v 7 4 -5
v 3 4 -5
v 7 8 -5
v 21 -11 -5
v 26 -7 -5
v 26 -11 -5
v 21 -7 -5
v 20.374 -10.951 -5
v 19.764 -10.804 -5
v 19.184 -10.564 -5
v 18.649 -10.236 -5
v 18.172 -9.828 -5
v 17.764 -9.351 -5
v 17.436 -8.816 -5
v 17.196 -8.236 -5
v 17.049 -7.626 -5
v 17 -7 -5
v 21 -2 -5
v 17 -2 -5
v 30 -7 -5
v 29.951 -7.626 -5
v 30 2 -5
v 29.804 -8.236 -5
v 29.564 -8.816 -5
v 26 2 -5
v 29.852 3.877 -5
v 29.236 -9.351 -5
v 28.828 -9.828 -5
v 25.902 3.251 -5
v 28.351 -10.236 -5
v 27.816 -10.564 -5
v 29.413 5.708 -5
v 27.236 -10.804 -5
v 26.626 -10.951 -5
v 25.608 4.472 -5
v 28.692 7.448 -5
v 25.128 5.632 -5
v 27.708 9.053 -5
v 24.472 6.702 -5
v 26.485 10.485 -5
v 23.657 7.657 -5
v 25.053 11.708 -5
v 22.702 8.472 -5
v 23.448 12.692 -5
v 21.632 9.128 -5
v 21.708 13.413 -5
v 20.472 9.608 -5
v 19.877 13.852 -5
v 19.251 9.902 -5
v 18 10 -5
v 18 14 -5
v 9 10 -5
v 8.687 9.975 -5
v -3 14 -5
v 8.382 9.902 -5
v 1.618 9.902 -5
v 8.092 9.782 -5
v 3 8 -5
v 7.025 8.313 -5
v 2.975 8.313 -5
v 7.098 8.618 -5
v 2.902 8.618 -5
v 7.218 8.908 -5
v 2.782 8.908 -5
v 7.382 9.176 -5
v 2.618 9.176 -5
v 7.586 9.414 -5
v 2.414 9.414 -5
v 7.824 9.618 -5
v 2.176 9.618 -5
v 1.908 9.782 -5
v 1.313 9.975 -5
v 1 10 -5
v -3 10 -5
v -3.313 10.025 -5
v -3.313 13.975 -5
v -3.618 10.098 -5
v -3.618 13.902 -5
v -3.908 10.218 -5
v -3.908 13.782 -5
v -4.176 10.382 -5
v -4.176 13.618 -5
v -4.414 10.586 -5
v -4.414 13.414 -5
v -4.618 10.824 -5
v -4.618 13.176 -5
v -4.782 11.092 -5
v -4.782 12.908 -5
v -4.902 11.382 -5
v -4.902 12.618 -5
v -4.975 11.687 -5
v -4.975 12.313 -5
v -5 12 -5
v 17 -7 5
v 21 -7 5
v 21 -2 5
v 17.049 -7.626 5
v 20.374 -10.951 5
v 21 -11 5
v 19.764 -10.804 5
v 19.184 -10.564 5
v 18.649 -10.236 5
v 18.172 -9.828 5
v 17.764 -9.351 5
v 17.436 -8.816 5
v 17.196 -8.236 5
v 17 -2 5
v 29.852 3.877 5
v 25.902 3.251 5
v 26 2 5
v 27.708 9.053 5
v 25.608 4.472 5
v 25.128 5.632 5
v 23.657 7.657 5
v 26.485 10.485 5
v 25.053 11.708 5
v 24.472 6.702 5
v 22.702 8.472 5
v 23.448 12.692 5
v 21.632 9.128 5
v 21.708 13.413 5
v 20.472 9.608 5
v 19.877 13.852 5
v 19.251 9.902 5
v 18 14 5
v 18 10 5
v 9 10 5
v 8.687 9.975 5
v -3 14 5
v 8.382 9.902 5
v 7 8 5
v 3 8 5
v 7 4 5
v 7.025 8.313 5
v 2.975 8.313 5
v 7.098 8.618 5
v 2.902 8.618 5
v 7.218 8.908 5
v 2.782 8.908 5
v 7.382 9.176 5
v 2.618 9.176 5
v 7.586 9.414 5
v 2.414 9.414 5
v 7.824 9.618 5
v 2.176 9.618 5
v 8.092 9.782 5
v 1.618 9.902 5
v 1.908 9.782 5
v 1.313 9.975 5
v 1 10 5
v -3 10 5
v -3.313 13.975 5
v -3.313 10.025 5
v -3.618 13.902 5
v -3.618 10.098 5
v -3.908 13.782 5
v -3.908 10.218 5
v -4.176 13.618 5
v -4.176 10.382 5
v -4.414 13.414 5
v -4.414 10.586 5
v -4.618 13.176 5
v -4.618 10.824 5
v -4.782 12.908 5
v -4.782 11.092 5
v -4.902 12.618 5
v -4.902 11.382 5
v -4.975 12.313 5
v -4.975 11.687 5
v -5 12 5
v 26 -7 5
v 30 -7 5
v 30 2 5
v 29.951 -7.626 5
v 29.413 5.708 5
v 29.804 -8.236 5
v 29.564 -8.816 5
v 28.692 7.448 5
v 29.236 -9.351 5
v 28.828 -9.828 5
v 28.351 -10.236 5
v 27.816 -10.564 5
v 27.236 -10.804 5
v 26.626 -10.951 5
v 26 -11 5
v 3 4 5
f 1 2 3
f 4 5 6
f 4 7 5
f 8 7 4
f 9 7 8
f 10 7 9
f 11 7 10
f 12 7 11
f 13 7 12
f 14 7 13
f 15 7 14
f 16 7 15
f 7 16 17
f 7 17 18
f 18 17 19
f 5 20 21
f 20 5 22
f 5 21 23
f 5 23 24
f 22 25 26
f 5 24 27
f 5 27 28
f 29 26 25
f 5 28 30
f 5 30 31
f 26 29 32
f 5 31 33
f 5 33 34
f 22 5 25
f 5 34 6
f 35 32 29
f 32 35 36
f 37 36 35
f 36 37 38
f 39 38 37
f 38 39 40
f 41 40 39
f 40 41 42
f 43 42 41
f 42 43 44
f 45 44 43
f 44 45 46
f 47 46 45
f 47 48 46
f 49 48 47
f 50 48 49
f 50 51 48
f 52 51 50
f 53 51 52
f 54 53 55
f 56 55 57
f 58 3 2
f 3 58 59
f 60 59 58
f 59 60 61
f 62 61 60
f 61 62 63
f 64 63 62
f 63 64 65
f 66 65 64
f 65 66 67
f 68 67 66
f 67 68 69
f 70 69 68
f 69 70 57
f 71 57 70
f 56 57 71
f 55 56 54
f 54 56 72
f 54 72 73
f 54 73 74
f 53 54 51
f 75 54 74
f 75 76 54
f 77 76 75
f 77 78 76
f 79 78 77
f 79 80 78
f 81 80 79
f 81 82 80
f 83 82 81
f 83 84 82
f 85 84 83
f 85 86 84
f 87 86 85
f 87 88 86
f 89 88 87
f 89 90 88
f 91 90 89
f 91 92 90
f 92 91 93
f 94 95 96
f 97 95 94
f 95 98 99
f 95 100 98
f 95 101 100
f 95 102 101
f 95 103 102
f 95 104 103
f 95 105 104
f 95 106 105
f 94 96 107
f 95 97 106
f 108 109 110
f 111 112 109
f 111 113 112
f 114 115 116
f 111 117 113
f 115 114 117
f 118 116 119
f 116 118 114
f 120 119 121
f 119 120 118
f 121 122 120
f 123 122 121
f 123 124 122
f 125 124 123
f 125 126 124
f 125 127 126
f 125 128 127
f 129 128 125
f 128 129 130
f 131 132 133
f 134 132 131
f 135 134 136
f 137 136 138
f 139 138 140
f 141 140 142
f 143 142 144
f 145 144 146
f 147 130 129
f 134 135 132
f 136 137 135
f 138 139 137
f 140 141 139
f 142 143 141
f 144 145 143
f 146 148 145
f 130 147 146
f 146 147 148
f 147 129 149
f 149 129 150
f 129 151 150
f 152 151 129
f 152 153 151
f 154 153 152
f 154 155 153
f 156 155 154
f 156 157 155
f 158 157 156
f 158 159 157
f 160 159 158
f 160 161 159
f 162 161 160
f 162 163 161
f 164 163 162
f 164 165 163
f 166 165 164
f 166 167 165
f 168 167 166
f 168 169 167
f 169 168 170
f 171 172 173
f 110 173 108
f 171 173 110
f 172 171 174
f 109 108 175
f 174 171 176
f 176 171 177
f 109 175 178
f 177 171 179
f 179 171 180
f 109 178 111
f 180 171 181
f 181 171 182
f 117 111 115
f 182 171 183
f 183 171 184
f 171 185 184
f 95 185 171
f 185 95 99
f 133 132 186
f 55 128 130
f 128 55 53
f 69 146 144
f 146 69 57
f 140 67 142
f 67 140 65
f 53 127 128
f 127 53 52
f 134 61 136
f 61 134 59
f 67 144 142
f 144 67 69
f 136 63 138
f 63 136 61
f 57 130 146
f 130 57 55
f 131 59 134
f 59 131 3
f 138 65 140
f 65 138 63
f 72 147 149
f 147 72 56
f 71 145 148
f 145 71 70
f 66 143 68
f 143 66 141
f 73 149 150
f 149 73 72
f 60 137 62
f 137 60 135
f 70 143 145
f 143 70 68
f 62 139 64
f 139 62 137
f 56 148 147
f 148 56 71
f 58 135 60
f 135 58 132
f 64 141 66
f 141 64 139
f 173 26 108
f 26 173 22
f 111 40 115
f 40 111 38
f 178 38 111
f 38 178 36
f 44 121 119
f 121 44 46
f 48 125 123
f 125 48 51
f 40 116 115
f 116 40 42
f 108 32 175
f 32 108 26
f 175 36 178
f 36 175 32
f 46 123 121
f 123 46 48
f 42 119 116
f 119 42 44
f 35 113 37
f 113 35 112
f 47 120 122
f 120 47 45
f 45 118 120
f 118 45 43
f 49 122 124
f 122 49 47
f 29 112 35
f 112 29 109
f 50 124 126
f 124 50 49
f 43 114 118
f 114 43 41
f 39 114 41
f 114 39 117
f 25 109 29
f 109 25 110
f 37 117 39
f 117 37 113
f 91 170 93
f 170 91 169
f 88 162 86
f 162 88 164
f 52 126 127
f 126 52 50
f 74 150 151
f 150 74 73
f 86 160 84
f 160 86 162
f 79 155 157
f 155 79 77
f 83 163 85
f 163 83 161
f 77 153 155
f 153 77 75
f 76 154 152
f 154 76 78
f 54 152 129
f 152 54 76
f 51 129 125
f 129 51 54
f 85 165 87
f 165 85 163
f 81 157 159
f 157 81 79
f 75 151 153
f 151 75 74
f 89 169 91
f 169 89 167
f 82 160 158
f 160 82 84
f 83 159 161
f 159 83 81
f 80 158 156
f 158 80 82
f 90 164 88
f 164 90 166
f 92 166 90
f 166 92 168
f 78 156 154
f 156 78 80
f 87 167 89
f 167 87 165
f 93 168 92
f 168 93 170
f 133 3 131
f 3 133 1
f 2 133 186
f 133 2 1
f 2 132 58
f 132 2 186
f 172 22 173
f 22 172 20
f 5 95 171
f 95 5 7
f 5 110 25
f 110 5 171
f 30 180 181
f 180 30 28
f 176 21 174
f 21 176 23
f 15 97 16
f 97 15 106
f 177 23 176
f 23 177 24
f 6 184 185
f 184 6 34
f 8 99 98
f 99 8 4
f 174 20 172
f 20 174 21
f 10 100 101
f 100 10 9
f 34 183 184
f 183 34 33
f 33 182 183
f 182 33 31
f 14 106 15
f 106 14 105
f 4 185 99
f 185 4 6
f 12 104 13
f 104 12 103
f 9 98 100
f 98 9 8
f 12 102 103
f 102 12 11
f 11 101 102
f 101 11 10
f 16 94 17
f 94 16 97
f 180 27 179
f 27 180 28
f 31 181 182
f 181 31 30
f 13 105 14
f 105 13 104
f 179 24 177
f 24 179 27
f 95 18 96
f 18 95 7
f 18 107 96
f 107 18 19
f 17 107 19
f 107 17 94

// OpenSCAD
//Clip for plastic storage box
//by Khairulmizam Samsudin, Sept 2016
//xource@gmail.com
//"clip_lid_storage_box" is licenced under Creative Commons :
//Attribution-NonCommercial-ShareAlike 4.0 International (CC BY-NC-SA 4.0)
//http://creativecommons.org/licenses/by-nc-sa/4.0/

//UPDATES:
//7/10/2016 - Released

/* [Options] */
// preview[view:south east, tilt:top diagonal]
// Clip thickness.
Clip_thickness=4; // [1:10]
// Width of the clip.
Clip_width=10; // [5:50]
// Section A length.
Section_A=6; // [3:10]
// Section B length.
Section_B=6; // [2:10]
// Section B fillet radius.
Section_BR=2; // [0:5]
// Section C length.
Section_C=19; // [10:30]
// Section C fillet radius.
Section_CR=8; // [0:20]
// Section D length.
Section_D=17; // [5:20]
// Section E length.
Section_E=5; // [5:20]
// Section F length.
Section_F=5; // [5:20]
// Number of clip to generate
Clip_number=1; // [1:4]

/* [Hidden] */
N=Clip_number; 
W=Clip_width;
T=Clip_thickness;
aL=Section_A;
aW=W;
aT=T;
R1=Section_BR;
bL=T;
bW=W;
bT=Section_B;
cL=Section_C;
cW=W;
cT=T;
R2=Section_CR;
dL=T;
dW=W;
dT=Section_D;
eL=Section_E;
eW=W;
eT=T;
fL=T;
fW=W;
fT=Section_F;

$fn=40;
epsilon=0.1;
module ocylinder(r1,r2,h) {
    difference() {
        cylinder(r=r1,h=h,center=true);
        cylinder(r=r2,h=h+epsilon,center=true);
    }
}

module a() {
    hull() {
        translate([-cL/2-aL-T,0,0]) rotate([90,0,0]) cylinder(r=T/2,h=W,center=true);
        translate([-0.5-cL/2-T,0,0]) cube([1,cW,cT],center=true);
    }
}

module fillet(R) {
    difference() {
        rotate([90,0,0]) ocylinder(r1=R+T,r2=R,h=W);
        coL=R+T;
        coW=W;
        coT=coL*2;
        //translate([coL/2+epsilon,0,0]) cube([coL+epsilon,coW+epsilon,coT],center=true);
        //translate([0,0,-coL/2-epsilon]) cube([coT+epsilon,coW+epsilon,coL+epsilon],center=true);
        translate([coT/2,0,0]) cube([coT,coW+epsilon,coT],center=true);
        translate([0,0,-coT/2]) cube([coT,coW+epsilon,coT],center=true);
    }
}

module lid_clip() {
    hull() {
        a();
        translate([-R2/2,0,0]) cube([cL-R2,cW,cT],center=true);
    }
    translate([R1-cL/2,0,-R1-T/2]) fillet(R=R1);
    translate([R1-cL/2-R1*2-T,0,-R1-T/2]) mirror([1,0,0]) fillet(R=R1);
    translate([-bL/2-cL/2,0,-bT/2-cT/2]) cube([bL,cW,bT],center=true);
    translate([-R2+cL/2,0,-R2-T/2]) mirror([1,0,0]) fillet(R=R2);
    translate([cL/2+dL/2,0,-dT/2-cT/2-R2/2]) cube([dL,dW,dT-R2],center=true);
    hull() {
        translate([cL/2,0,-dT-T/2]) rotate([0,180,0]) fillet(R=0);
        translate([-eL/2+cL/2,0,-eT-dT]) cube([eL,eW,eT],center=true);
        translate([cL/2-eL,0,-dT-T/2]) rotate([0,-90,0]) fillet(R=0);
    }
    translate([-fL/2+cL/2-eL,0,fT/2-dT-T/2]) cube([fL,fW,fT],center=true);
}

module c1() {
    rotate([-90,0,0]) translate([cL/2+bL+aL/2,0,aT/2+bT+T]) lid_clip();
}


c1();
if (N>1) { rotate([0,0,90]) c1(); }
if (N>2) { rotate([0,0,180]) c1(); }
if (N>3) { rotate([0,0,270]) c1(); }

//translate([-T,0,-cL/2-bL-aL-T*2]) rotate([0,90,0]) lid_clip();
